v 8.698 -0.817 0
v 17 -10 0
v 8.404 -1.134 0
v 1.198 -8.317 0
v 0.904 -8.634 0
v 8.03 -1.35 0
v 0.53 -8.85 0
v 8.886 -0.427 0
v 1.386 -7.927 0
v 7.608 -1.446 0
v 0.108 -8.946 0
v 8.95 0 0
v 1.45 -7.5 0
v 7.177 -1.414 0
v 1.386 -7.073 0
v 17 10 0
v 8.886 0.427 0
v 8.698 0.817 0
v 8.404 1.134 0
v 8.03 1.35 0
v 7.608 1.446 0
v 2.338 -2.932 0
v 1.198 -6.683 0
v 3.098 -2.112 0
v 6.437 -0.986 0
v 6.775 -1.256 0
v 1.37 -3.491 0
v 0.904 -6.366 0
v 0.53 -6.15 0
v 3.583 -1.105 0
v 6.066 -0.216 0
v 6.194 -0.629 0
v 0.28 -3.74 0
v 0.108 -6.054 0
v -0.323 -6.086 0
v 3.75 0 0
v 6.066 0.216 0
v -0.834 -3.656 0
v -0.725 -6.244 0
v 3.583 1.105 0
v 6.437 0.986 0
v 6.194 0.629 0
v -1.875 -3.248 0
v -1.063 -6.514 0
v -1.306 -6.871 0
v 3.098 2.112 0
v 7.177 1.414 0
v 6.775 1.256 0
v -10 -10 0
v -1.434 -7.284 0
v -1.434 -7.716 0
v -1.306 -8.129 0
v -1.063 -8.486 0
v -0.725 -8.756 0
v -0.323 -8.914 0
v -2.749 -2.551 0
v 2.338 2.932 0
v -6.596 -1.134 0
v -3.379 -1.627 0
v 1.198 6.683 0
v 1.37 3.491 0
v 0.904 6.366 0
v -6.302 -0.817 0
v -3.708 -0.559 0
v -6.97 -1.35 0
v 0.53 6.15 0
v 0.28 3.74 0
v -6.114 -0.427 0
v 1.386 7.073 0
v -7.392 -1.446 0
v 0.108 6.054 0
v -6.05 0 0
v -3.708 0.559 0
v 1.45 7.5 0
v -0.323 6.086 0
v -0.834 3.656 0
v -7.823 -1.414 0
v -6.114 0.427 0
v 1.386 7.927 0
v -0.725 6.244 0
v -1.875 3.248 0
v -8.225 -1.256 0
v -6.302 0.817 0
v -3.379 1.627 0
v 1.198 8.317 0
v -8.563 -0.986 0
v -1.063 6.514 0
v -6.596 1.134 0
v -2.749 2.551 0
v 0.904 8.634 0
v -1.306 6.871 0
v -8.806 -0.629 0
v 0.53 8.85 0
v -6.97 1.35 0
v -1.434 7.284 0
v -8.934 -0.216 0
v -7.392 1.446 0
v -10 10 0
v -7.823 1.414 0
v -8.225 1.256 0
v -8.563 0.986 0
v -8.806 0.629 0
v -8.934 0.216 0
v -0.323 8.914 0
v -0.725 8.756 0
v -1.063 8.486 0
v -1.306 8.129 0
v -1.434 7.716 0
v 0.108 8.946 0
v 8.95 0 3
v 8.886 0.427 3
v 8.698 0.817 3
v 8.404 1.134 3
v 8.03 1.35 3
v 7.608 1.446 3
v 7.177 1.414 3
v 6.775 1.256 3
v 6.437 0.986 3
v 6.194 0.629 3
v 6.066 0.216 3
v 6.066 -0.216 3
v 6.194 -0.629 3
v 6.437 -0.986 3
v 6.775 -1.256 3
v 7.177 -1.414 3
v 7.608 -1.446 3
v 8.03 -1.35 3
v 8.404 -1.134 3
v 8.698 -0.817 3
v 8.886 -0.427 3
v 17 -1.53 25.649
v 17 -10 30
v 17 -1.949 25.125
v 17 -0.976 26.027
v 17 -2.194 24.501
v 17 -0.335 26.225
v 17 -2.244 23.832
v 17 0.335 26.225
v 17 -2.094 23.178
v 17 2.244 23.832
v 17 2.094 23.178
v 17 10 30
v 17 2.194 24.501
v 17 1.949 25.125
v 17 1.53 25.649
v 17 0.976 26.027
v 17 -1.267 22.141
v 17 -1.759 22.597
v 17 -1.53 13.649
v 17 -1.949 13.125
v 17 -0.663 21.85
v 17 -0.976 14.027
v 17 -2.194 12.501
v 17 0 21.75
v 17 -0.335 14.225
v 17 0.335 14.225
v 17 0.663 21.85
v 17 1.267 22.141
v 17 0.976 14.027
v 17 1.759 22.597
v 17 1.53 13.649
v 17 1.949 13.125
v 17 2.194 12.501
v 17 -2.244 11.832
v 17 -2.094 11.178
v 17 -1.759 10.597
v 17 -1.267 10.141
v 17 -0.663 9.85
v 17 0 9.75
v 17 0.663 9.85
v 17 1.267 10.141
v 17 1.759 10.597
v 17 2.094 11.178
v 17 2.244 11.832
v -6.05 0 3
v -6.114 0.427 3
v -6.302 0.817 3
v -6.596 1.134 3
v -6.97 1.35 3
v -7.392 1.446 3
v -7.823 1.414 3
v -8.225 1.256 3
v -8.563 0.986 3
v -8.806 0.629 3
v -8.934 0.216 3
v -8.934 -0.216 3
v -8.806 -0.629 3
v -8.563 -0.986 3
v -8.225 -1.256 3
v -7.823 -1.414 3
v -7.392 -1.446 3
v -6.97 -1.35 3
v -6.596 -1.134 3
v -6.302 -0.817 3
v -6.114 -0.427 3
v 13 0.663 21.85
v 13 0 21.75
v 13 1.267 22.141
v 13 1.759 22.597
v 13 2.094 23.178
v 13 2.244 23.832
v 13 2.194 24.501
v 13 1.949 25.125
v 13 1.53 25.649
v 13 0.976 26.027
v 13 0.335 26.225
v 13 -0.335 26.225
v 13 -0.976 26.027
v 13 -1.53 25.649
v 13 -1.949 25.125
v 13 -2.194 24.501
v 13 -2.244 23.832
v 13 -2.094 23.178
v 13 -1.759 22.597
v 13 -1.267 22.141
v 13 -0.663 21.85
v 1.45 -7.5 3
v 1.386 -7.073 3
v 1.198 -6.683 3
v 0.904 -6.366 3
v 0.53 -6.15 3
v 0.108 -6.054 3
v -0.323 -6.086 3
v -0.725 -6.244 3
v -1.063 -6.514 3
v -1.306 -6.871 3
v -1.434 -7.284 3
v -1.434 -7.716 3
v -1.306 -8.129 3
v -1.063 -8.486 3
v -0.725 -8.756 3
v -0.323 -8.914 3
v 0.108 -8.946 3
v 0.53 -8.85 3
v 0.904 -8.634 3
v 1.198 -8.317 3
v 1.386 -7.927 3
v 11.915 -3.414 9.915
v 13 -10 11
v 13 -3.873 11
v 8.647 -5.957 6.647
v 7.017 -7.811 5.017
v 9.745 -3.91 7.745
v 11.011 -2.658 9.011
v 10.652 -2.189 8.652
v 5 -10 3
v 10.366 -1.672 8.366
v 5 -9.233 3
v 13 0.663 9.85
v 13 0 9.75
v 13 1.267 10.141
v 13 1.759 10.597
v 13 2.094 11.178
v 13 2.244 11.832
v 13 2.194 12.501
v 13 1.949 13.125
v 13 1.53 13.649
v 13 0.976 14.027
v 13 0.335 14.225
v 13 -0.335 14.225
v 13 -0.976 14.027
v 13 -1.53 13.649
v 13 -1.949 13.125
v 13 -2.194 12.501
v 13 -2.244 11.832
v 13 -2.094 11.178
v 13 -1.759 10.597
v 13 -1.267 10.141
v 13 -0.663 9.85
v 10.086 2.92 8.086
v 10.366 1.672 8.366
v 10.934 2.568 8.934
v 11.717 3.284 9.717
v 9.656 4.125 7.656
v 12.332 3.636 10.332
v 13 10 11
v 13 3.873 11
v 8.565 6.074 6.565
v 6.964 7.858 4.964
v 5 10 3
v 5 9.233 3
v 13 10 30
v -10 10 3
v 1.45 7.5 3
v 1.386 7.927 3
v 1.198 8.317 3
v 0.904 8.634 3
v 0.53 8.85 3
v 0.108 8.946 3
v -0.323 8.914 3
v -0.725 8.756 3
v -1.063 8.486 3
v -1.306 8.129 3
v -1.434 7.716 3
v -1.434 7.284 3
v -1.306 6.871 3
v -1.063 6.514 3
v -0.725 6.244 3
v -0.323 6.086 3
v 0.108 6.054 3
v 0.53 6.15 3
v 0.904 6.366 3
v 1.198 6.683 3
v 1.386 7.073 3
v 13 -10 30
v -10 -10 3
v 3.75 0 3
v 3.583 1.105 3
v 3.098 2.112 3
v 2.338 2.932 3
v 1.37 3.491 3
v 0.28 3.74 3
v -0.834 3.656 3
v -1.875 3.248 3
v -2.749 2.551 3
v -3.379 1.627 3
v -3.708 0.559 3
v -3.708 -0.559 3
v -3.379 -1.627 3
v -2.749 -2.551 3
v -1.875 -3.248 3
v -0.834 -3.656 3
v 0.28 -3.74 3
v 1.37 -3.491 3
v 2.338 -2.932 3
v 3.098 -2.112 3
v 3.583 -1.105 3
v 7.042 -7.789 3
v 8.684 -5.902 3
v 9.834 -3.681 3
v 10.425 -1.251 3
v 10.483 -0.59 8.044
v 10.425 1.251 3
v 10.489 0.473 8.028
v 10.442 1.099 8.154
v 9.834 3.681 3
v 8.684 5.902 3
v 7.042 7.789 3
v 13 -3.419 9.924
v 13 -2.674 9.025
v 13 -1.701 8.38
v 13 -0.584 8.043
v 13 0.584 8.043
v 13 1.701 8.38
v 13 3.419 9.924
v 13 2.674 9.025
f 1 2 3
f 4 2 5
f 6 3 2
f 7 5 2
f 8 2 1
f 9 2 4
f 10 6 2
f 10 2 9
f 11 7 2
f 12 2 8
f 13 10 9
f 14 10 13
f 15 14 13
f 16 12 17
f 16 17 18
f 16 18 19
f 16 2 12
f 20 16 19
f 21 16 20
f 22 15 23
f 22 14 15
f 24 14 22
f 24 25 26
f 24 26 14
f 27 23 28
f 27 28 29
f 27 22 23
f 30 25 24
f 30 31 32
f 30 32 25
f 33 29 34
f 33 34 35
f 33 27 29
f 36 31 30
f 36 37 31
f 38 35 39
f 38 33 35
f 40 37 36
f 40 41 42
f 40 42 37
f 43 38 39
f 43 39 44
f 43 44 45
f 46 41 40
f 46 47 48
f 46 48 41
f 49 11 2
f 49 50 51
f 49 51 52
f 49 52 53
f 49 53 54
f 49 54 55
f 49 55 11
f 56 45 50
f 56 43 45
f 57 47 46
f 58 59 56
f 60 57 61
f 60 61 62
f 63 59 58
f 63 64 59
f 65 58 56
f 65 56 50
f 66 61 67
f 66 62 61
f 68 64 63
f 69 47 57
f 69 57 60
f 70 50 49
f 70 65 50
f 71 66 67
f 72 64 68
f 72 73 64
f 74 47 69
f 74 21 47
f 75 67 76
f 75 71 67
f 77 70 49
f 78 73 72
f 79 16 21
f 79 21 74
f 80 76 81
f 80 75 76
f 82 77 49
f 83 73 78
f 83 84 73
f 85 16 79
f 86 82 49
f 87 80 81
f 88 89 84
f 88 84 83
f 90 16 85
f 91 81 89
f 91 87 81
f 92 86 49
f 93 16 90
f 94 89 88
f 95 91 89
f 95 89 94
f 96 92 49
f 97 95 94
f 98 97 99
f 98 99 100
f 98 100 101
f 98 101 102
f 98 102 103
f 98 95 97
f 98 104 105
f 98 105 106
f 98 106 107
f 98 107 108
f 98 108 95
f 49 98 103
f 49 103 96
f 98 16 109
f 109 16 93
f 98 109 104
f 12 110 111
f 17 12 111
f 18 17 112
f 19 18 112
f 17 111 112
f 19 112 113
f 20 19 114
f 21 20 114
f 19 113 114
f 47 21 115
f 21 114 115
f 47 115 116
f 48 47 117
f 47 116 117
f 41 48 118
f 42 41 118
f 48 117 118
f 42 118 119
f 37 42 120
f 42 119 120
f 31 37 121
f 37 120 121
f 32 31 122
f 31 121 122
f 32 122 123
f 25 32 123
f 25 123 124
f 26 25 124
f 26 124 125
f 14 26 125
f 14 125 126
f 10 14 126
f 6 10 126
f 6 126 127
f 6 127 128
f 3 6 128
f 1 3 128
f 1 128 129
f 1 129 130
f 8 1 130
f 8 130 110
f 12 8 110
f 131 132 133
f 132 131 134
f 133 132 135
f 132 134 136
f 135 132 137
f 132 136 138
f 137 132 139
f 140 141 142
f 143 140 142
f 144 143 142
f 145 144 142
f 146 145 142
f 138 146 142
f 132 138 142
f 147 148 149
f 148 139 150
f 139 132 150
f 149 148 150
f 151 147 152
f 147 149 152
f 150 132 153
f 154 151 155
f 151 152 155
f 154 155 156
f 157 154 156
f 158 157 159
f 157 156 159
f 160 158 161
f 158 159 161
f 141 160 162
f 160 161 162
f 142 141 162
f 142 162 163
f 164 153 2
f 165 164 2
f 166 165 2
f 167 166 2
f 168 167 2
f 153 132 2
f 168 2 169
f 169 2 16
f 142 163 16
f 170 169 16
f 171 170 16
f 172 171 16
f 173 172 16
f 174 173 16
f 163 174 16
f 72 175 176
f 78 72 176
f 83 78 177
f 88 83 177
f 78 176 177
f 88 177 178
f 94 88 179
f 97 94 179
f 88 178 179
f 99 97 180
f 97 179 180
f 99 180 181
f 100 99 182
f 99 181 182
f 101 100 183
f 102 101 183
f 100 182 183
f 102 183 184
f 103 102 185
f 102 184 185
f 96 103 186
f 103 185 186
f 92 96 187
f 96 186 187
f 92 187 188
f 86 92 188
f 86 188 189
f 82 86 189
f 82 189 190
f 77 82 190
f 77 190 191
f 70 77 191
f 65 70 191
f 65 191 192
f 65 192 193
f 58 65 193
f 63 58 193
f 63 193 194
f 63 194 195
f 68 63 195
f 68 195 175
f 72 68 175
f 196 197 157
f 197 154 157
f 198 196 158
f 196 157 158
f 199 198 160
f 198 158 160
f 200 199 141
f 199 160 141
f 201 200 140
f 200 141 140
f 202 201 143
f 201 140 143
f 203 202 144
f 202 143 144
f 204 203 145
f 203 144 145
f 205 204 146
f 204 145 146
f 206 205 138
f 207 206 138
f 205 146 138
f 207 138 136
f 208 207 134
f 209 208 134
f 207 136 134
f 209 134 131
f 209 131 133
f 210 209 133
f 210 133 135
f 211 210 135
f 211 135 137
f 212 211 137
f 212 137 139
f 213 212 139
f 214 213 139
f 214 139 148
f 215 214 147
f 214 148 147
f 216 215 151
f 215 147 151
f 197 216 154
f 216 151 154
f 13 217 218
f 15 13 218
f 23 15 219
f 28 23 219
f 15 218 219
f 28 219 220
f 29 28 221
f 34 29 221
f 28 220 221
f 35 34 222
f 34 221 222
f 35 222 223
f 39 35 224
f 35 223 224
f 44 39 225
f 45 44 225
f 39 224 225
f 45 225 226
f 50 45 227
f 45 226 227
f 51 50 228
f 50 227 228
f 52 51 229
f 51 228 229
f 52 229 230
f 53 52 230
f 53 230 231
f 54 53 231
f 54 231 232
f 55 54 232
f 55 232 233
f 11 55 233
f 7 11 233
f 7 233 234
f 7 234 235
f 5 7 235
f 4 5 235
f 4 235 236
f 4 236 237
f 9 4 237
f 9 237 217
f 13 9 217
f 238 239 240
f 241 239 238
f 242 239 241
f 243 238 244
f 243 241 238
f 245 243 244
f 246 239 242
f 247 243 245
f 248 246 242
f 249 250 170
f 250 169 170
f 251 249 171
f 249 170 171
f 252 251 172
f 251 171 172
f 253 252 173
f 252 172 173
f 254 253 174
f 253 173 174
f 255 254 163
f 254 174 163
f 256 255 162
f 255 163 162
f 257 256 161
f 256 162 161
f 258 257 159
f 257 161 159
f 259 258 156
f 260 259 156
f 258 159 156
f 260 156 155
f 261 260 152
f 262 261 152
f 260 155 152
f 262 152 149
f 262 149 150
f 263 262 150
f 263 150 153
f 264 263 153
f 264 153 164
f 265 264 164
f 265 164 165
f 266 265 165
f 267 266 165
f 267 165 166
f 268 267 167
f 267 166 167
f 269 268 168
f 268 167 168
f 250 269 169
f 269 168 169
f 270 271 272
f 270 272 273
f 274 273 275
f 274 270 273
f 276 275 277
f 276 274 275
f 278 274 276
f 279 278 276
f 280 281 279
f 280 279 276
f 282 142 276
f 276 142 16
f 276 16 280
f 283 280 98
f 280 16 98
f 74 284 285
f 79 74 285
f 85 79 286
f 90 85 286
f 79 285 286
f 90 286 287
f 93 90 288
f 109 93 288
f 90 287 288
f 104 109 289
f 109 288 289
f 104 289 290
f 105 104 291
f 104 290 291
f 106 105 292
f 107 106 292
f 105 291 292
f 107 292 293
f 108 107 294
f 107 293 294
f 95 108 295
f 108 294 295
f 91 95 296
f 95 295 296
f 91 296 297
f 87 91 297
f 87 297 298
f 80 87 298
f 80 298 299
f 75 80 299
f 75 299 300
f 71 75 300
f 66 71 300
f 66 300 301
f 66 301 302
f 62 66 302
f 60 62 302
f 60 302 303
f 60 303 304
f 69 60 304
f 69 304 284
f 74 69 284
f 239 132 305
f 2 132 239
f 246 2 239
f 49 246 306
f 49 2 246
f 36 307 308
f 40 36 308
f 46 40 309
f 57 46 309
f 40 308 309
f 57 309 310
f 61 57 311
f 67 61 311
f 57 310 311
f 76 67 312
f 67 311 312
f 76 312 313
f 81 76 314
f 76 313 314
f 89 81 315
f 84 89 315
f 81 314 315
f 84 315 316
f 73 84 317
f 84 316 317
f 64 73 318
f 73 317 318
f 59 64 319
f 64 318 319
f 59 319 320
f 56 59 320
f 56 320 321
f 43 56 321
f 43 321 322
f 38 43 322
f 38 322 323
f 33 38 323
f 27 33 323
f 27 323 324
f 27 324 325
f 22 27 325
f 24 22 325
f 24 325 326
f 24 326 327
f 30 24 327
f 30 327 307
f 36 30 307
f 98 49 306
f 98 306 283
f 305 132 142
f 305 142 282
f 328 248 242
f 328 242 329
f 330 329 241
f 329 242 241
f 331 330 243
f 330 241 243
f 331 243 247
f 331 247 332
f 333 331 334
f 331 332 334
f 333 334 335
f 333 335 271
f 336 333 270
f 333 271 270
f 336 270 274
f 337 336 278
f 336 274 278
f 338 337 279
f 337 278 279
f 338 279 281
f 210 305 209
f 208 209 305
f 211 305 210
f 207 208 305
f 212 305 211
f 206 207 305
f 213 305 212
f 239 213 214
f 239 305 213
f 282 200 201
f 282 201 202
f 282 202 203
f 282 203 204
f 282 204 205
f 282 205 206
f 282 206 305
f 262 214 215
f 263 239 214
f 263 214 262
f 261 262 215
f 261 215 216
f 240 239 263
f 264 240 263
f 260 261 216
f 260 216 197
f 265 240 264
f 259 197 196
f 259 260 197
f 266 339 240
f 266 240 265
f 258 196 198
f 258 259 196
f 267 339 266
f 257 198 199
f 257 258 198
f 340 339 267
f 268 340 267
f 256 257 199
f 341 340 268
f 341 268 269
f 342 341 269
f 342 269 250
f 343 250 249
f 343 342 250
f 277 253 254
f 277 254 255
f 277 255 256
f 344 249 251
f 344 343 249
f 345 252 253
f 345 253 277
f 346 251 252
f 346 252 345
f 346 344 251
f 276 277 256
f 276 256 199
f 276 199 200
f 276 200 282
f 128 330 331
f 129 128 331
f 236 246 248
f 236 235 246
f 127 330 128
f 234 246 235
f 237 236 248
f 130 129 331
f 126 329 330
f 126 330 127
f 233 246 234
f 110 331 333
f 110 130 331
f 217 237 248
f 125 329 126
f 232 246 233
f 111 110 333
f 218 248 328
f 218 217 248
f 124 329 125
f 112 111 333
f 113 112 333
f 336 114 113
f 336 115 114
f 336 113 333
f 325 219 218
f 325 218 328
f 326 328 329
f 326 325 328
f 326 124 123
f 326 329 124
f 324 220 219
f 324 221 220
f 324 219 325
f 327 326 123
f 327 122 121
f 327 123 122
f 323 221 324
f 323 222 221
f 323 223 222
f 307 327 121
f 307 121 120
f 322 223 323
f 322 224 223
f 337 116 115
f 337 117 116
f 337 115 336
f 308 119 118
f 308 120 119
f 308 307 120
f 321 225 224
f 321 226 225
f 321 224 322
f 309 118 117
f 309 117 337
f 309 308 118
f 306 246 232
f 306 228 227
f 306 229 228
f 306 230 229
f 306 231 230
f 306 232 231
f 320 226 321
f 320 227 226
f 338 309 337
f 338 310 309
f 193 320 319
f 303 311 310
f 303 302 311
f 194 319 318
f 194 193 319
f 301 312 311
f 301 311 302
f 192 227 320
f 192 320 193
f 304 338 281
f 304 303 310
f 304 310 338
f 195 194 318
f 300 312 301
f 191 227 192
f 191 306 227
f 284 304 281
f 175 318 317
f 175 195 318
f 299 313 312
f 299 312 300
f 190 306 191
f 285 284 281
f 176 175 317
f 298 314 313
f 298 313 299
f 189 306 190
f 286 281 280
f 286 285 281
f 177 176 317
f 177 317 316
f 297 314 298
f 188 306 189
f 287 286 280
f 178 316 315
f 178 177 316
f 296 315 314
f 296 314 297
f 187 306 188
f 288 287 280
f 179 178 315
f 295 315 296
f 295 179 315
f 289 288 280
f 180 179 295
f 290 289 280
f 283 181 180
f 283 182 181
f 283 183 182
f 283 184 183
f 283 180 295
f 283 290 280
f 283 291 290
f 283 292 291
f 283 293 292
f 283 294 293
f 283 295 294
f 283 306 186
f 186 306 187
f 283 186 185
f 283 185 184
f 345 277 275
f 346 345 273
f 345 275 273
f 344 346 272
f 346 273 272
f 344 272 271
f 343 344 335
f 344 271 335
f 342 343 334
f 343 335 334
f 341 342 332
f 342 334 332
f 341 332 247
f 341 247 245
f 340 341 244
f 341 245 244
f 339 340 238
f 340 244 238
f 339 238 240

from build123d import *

# Parameters (mm, degrees)
SKETCH_1_W                   = 20
SKETCH_1_H                   = 20
EXTRUDE_1_DEPTH              = 3
SKETCH_8_W                   = 3
SKETCH_8_H                   = 20
EXTRUDE_3_DEPTH              = 3
SKETCH_2_R                   = 3.75
CUT_EXTRUDE_1_DEPTH          = 17.673332001
SKETCH_3_W                   = 4
SKETCH_3_H                   = 20
EXTRUDE_2_DEPTH              = 30
CHAMFER_1_SIZE               = 8
SKETCH_9_R                   = 10.5
CUT_EXTRUDE_2_DEPTH          = 27
HOLE_WIZARD_M4_1_D           = 4.5
HOLE_WIZARD_M4_1_CBORE_D     = 8
HOLE_WIZARD_M4_1_CBORE_DEPTH = 23
HOLE_WIZARD_M2_5_1_D         = 2.9


with BuildPart() as part:
    # 草圖1 → 填料-伸長1 (new body)
    with BuildSketch(Plane.XY):
        Rectangle(SKETCH_1_W, SKETCH_1_H)
    extrude(amount=EXTRUDE_1_DEPTH)

    # 草圖8 → 填料-伸長3 (add)
    with BuildSketch(Plane(origin=(10, 0, 0), x_dir=(0, 0, -1), z_dir=(1, 0, 0))):
        with Locations((-1.5, 0)):
            Rectangle(SKETCH_8_W, SKETCH_8_H)
    extrude(amount=EXTRUDE_3_DEPTH)

    # 草圖2 → 除料-伸長1 (cut, through all)
    with BuildSketch(Plane.XY.offset(3)):
        Circle(SKETCH_2_R)
    extrude(amount=-CUT_EXTRUDE_1_DEPTH, mode=Mode.SUBTRACT)

    # 草圖3 → 填料-伸長2 (add)
    with BuildSketch(Plane(origin=(0, 0, 0), x_dir=(-1, 0, 0), z_dir=(0, 0, -1))):
        with Locations((-15, 0)):
            Rectangle(SKETCH_3_W, SKETCH_3_H)
    extrude(amount=-EXTRUDE_2_DEPTH)

    # 導角1
    chamfer_1_edges = [part.edges().sort_by_distance(p)[0] for p in [
        (13, 0, 3),
    ]]
    chamfer(chamfer_1_edges, length=CHAMFER_1_SIZE)

    # 草圖9 → 除料-伸長2 (cut)
    with BuildSketch(Plane.XY.offset(30)):
        Circle(SKETCH_9_R)
    extrude(amount=-CUT_EXTRUDE_2_DEPTH, mode=Mode.SUBTRACT)

    # M4 凹頭蓋螺釘的柱孔1 (through all)
    with Locations(Plane.ZY.offset(10)):
        with Locations((24, 0), (12, 0)):
            CounterBoreHole(HOLE_WIZARD_M4_1_D / 2, HOLE_WIZARD_M4_1_CBORE_D / 2, HOLE_WIZARD_M4_1_CBORE_DEPTH)

    # M2.5 餘隙孔1 (through all)
    with Locations(Plane(origin=(0, 0, 0), x_dir=(-1, 0, 0), z_dir=(0, 0, -1))):
        with Locations((0, -7.5), (0, 7.5), (-7.5, 0), (7.5, 0)):
            Hole(HOLE_WIZARD_M2_5_1_D / 2)


solid = part.part
